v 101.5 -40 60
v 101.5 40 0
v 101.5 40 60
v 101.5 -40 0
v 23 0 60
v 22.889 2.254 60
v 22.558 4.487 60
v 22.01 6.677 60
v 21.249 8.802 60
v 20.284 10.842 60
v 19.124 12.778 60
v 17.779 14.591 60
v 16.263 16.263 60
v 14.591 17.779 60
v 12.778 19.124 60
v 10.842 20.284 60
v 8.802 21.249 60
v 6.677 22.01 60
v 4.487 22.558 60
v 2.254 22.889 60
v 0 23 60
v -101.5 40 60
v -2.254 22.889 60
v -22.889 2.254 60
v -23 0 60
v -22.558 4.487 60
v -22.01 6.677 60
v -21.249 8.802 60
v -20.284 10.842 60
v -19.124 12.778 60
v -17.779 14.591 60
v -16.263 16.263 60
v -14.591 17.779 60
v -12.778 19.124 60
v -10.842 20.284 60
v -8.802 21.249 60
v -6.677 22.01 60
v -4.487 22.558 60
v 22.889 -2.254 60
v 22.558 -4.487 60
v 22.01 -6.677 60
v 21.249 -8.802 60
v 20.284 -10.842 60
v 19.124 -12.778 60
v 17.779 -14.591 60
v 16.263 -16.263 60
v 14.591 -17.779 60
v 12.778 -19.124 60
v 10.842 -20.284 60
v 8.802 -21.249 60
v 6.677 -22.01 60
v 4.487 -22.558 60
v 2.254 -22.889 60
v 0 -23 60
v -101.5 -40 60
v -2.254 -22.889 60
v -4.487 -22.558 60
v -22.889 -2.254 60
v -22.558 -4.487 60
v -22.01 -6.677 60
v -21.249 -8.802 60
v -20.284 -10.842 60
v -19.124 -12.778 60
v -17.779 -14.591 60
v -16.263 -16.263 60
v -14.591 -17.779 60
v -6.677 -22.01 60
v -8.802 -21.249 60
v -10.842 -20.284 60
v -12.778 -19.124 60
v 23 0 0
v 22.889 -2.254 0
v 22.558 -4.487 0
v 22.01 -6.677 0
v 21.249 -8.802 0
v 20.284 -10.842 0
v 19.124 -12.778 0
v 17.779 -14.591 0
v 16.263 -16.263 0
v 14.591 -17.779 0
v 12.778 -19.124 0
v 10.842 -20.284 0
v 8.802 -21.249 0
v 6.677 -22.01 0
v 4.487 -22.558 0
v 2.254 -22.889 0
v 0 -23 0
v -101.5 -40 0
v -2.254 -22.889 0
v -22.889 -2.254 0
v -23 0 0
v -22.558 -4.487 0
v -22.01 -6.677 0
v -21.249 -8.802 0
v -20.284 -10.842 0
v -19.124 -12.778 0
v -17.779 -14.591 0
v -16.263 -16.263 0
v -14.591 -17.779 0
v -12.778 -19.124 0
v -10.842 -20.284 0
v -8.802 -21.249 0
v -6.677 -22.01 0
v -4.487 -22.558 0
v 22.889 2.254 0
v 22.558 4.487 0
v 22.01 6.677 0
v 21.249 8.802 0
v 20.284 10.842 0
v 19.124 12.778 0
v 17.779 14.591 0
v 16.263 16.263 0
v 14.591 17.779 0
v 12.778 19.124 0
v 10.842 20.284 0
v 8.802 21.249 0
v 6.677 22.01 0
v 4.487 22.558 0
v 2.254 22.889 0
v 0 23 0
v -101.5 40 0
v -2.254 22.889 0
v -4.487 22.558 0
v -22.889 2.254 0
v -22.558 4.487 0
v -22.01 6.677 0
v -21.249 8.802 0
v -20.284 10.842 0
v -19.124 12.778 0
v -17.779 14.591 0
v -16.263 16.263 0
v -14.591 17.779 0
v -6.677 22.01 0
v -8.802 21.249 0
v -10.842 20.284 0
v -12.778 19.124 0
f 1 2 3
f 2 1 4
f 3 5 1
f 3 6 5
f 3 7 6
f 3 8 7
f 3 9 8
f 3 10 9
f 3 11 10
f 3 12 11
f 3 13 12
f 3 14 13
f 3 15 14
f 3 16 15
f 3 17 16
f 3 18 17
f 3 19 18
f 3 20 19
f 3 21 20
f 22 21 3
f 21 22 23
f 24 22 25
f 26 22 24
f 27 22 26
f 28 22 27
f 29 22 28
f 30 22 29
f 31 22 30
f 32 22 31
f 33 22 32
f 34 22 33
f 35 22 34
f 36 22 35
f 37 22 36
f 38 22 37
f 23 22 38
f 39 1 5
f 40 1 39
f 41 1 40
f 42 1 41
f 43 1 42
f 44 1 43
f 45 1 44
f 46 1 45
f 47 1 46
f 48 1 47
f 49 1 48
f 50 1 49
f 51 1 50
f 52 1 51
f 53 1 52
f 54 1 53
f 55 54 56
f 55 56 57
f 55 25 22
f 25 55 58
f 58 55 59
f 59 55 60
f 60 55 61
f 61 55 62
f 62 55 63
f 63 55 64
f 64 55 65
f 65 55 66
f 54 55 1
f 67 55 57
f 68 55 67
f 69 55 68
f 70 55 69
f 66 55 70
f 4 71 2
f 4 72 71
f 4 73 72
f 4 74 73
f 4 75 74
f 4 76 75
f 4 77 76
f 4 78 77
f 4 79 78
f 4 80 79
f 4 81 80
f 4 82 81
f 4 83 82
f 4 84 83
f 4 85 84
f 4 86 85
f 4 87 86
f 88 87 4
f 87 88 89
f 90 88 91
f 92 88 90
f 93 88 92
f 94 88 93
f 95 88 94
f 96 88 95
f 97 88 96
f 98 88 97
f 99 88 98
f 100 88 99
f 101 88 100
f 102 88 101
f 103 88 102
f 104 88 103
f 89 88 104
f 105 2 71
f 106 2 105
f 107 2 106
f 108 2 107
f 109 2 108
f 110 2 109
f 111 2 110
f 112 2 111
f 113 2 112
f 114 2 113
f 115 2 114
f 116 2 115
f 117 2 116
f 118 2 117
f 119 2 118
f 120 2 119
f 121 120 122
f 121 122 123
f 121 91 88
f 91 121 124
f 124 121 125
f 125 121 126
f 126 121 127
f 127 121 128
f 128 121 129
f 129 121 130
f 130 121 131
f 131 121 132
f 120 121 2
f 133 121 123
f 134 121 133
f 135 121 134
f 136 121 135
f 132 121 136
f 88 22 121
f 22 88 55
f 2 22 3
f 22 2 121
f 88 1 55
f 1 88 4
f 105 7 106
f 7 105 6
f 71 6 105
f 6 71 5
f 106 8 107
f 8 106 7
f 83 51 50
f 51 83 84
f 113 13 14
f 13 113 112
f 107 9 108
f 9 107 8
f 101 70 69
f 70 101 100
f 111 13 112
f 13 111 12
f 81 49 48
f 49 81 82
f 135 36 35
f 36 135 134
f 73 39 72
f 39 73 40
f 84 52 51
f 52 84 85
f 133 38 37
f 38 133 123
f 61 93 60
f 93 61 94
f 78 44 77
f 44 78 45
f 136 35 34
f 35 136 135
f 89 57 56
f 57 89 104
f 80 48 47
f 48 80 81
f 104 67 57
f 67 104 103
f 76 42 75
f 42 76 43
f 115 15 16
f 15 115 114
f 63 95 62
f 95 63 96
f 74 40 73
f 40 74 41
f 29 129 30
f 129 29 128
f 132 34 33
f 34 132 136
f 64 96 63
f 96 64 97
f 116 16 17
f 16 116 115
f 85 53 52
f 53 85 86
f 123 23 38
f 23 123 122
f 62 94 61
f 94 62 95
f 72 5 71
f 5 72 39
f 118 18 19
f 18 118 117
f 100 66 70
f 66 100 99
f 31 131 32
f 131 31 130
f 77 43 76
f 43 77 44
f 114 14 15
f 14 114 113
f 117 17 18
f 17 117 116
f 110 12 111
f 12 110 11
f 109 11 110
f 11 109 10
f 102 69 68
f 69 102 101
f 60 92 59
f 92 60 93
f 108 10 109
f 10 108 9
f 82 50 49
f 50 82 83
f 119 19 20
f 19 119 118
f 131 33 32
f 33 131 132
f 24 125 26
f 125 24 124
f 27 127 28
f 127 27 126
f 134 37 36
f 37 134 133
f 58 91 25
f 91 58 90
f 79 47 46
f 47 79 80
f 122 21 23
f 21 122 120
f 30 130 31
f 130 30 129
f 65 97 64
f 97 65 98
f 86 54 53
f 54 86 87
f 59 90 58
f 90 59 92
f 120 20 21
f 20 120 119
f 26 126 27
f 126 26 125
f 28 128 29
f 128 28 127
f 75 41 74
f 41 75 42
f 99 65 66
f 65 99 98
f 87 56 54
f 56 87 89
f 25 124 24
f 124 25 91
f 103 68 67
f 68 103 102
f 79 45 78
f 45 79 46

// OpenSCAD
// Built by bench/smallmodels/features/compiler.py from a list of features.
$fn = 64;
difference() {
  union() {
    translate([0, 0, 0]) translate([-101.5, -40, 0]) cube([203, 80, 60]);
  }
  union() {
    translate([0, 0, -1]) rotate([0, 0, 0]) cylinder(d = 46, h = 62);
  }
}
